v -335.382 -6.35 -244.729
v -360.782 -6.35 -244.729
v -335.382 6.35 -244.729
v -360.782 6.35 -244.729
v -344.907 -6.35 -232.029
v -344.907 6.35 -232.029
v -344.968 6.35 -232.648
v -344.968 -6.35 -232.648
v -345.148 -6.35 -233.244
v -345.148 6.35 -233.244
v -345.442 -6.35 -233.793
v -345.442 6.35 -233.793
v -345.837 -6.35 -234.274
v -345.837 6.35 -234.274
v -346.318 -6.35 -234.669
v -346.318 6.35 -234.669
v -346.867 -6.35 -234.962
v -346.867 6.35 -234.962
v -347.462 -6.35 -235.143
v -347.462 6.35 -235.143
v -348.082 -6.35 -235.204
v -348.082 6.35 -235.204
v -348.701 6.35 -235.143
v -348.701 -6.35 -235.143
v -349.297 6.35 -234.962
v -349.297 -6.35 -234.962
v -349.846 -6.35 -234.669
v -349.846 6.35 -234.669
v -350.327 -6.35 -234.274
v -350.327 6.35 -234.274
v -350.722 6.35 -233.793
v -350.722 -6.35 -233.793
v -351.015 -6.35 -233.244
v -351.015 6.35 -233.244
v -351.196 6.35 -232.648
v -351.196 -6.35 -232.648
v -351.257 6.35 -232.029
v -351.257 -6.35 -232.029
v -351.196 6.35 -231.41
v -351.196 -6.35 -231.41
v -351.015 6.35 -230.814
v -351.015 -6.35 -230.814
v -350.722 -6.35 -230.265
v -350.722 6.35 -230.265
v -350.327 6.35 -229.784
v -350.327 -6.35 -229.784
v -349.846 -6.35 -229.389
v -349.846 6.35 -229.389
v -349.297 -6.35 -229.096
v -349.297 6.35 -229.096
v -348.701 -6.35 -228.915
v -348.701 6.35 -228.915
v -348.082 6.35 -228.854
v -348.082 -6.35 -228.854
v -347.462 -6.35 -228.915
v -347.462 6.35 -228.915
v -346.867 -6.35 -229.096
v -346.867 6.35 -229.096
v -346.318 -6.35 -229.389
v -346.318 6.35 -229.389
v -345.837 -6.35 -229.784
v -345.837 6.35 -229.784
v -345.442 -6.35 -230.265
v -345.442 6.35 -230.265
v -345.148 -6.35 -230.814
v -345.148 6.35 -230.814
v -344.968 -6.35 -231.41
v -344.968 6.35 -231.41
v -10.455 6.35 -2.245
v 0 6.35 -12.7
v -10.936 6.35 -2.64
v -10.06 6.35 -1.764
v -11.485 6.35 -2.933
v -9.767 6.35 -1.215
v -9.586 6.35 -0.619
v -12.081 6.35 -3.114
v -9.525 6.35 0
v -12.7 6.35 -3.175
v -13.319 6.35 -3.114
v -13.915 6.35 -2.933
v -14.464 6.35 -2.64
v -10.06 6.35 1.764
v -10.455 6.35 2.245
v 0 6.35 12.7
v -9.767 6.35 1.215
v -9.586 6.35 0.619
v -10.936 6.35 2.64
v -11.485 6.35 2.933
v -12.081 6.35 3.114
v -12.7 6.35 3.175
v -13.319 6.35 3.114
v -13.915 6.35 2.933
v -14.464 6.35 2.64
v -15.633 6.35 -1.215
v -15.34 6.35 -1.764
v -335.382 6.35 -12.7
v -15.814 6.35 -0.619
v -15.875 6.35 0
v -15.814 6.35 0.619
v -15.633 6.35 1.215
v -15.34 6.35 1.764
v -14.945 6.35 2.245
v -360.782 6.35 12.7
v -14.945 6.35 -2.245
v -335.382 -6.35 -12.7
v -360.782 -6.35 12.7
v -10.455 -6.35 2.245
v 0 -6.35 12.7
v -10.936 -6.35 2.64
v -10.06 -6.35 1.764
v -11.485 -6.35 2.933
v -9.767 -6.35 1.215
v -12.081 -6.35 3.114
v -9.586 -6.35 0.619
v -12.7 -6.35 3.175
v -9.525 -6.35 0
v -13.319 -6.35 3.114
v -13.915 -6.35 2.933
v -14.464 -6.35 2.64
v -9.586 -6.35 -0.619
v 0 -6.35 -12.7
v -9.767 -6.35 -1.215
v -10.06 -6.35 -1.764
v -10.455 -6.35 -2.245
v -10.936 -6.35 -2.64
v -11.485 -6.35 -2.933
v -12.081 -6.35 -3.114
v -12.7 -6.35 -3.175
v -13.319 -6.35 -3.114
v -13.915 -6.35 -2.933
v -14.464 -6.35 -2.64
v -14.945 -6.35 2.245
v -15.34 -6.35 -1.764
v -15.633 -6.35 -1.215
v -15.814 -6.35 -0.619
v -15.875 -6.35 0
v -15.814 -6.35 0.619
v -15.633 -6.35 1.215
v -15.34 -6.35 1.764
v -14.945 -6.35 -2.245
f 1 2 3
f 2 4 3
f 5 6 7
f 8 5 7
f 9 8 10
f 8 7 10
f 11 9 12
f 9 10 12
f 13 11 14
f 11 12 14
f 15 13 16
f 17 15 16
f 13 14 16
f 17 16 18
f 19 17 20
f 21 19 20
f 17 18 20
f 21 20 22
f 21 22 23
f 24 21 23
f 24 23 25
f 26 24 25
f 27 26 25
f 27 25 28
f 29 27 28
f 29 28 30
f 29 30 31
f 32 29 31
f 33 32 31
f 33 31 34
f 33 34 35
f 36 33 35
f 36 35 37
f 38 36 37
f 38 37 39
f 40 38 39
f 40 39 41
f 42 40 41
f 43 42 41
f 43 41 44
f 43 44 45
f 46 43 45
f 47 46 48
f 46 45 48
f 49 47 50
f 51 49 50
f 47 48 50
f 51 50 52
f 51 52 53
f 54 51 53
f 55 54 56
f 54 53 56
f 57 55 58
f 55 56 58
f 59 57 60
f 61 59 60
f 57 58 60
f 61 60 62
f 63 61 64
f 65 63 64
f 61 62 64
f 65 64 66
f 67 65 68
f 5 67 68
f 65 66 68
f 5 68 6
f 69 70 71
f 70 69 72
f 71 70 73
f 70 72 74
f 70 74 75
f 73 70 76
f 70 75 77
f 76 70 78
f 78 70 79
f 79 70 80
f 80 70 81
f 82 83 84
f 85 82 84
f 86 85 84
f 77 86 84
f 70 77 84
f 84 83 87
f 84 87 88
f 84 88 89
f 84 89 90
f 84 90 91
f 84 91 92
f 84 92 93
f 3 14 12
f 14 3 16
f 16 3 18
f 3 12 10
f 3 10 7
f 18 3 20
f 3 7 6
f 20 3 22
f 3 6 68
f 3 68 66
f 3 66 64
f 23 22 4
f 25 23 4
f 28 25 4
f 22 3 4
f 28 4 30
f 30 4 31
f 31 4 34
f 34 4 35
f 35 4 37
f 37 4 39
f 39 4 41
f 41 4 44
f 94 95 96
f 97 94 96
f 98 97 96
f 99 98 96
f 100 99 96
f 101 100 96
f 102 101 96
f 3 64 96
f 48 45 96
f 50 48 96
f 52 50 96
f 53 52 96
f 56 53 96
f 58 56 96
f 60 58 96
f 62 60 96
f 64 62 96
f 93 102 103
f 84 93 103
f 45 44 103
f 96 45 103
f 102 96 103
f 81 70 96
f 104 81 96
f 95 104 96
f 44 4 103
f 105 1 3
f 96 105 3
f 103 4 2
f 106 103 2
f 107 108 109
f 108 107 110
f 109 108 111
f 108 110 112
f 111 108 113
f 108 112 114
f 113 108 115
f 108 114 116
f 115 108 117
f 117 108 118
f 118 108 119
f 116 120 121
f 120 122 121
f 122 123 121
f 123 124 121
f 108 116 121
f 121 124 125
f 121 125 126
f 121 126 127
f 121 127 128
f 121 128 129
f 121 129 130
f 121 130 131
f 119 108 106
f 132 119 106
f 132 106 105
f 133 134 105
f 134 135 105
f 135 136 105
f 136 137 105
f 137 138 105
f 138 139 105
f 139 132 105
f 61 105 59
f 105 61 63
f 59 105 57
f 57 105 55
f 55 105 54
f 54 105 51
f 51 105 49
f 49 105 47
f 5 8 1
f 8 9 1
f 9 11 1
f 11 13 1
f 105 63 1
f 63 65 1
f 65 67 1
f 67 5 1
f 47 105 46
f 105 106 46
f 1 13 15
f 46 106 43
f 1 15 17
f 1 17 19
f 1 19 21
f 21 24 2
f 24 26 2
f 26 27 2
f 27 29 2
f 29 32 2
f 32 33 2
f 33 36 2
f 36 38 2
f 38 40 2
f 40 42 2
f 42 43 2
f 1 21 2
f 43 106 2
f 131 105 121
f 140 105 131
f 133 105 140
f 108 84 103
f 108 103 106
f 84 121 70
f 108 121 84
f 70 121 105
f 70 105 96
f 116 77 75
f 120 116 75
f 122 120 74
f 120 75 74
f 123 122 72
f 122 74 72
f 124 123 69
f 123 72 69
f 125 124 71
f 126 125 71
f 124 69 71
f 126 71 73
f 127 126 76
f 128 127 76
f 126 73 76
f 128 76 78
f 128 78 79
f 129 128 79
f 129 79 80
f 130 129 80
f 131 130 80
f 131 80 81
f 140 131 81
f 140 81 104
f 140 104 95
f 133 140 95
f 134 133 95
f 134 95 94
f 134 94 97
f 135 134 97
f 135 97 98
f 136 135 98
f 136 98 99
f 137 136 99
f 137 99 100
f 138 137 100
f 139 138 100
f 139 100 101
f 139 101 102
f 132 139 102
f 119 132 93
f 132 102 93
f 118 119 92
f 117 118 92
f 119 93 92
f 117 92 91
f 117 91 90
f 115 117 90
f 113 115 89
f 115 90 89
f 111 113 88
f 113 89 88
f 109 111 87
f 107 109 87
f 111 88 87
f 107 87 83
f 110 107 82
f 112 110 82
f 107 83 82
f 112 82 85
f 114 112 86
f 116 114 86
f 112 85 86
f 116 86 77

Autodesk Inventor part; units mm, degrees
ref_plane "YZ Plane" through (0, 0, 0) normal (1, 0, 0) x (0, 1, 0)
ref_plane "XZ Plane" through (0, 0, 0) normal (0, 1, 0) x (-1, 0, 0)
ref_plane "XY Plane" through (0, 0, 0) normal (0, 0, 1) x (1, 0, 0)
sketch "Sketch7" plane through (0, 0, 0) normal (1, 0, 0) x (0, 1, 0)
  line L0 (6.35, 12.7) -> (-6.35, 12.7)
  line L1 (-6.35, 12.7) -> (-6.35, -12.7)
  line L2 (-6.35, -12.7) -> (6.35, -12.7)
  line L3 (6.35, -12.7) -> (6.35, 12.7)
  line L4 (6.35, 12.7) -> (-6.35, -12.7) construction
  line L5 (-6.35, 12.7) -> (6.35, -12.7) construction
  point P0 (0, 0)
  dimension "d30" = 12.7
  dimension "d31" = 25.4
sketch "Sketch9" plane through (0, 0, 0) normal (0, 1, 0) x (-1, 0, 0)
  line L0 (0, 0) -> (348.0816, 0)
  line L1 (348.0816, 0) -> (348.0816, -244.729)
  dimension "d34" = 244.729
  dimension "d35" = 348.0816
sweep "Sweep2" add profiles "Sketch7" path "Sketch9"
sketch "Sketch10" plane through (0, 6.35, 12.7) normal (0, 1, 0) x (1, 0, 0)
  line L0 (0, 0) -> (0, 25.4) projected
  line L1 (0, 25.4) -> (-335.3816, 25.4) projected
  line L2 (0, 0) -> (-25.4, 0)
  line L3 (-25.4, 0) -> (-25.4, 25.4)
  line L4 (-25.4, 25.4) -> (0, 25.4)
  line L5 (0, 25.4) -> (0, 0)
  circle A0 centre (-12.7, 12.7) radius 3.175
  line L6 (-335.3816, 257.429) -> (-360.7816, 257.429) projected
  line L7 (-360.7816, 0) -> (-360.7816, 257.429) projected
  line L8 (-335.3816, 257.429) -> (-360.7816, 257.429)
  line L9 (-360.7816, 257.429) -> (-360.7816, 232.029)
  line L10 (-360.7816, 232.029) -> (-335.3816, 232.029)
  line L11 (-335.3816, 232.029) -> (-335.3816, 257.429)
  circle A1 centre (-348.0816, 244.729) radius 3.175
  point P0 (0, 12.7)
  point P1 (-25.4, 12.7)
  point P2 (-12.7, 25.4)
  dimension "d38" = 25.4
  dimension "d39" = 6.35
  dimension "d40" = 12.7
  dimension "d41" = 12.7
  dimension "d42" = 25.4
  dimension "d43" = 6.35
  dimension "d44" = 12.7
  dimension "d45" = 12.7
extrude "Extrusion4" cut sketch "Sketch10" against normal blind 25.4 contours A0 | A1
properties part number "ArmRest(H)"
